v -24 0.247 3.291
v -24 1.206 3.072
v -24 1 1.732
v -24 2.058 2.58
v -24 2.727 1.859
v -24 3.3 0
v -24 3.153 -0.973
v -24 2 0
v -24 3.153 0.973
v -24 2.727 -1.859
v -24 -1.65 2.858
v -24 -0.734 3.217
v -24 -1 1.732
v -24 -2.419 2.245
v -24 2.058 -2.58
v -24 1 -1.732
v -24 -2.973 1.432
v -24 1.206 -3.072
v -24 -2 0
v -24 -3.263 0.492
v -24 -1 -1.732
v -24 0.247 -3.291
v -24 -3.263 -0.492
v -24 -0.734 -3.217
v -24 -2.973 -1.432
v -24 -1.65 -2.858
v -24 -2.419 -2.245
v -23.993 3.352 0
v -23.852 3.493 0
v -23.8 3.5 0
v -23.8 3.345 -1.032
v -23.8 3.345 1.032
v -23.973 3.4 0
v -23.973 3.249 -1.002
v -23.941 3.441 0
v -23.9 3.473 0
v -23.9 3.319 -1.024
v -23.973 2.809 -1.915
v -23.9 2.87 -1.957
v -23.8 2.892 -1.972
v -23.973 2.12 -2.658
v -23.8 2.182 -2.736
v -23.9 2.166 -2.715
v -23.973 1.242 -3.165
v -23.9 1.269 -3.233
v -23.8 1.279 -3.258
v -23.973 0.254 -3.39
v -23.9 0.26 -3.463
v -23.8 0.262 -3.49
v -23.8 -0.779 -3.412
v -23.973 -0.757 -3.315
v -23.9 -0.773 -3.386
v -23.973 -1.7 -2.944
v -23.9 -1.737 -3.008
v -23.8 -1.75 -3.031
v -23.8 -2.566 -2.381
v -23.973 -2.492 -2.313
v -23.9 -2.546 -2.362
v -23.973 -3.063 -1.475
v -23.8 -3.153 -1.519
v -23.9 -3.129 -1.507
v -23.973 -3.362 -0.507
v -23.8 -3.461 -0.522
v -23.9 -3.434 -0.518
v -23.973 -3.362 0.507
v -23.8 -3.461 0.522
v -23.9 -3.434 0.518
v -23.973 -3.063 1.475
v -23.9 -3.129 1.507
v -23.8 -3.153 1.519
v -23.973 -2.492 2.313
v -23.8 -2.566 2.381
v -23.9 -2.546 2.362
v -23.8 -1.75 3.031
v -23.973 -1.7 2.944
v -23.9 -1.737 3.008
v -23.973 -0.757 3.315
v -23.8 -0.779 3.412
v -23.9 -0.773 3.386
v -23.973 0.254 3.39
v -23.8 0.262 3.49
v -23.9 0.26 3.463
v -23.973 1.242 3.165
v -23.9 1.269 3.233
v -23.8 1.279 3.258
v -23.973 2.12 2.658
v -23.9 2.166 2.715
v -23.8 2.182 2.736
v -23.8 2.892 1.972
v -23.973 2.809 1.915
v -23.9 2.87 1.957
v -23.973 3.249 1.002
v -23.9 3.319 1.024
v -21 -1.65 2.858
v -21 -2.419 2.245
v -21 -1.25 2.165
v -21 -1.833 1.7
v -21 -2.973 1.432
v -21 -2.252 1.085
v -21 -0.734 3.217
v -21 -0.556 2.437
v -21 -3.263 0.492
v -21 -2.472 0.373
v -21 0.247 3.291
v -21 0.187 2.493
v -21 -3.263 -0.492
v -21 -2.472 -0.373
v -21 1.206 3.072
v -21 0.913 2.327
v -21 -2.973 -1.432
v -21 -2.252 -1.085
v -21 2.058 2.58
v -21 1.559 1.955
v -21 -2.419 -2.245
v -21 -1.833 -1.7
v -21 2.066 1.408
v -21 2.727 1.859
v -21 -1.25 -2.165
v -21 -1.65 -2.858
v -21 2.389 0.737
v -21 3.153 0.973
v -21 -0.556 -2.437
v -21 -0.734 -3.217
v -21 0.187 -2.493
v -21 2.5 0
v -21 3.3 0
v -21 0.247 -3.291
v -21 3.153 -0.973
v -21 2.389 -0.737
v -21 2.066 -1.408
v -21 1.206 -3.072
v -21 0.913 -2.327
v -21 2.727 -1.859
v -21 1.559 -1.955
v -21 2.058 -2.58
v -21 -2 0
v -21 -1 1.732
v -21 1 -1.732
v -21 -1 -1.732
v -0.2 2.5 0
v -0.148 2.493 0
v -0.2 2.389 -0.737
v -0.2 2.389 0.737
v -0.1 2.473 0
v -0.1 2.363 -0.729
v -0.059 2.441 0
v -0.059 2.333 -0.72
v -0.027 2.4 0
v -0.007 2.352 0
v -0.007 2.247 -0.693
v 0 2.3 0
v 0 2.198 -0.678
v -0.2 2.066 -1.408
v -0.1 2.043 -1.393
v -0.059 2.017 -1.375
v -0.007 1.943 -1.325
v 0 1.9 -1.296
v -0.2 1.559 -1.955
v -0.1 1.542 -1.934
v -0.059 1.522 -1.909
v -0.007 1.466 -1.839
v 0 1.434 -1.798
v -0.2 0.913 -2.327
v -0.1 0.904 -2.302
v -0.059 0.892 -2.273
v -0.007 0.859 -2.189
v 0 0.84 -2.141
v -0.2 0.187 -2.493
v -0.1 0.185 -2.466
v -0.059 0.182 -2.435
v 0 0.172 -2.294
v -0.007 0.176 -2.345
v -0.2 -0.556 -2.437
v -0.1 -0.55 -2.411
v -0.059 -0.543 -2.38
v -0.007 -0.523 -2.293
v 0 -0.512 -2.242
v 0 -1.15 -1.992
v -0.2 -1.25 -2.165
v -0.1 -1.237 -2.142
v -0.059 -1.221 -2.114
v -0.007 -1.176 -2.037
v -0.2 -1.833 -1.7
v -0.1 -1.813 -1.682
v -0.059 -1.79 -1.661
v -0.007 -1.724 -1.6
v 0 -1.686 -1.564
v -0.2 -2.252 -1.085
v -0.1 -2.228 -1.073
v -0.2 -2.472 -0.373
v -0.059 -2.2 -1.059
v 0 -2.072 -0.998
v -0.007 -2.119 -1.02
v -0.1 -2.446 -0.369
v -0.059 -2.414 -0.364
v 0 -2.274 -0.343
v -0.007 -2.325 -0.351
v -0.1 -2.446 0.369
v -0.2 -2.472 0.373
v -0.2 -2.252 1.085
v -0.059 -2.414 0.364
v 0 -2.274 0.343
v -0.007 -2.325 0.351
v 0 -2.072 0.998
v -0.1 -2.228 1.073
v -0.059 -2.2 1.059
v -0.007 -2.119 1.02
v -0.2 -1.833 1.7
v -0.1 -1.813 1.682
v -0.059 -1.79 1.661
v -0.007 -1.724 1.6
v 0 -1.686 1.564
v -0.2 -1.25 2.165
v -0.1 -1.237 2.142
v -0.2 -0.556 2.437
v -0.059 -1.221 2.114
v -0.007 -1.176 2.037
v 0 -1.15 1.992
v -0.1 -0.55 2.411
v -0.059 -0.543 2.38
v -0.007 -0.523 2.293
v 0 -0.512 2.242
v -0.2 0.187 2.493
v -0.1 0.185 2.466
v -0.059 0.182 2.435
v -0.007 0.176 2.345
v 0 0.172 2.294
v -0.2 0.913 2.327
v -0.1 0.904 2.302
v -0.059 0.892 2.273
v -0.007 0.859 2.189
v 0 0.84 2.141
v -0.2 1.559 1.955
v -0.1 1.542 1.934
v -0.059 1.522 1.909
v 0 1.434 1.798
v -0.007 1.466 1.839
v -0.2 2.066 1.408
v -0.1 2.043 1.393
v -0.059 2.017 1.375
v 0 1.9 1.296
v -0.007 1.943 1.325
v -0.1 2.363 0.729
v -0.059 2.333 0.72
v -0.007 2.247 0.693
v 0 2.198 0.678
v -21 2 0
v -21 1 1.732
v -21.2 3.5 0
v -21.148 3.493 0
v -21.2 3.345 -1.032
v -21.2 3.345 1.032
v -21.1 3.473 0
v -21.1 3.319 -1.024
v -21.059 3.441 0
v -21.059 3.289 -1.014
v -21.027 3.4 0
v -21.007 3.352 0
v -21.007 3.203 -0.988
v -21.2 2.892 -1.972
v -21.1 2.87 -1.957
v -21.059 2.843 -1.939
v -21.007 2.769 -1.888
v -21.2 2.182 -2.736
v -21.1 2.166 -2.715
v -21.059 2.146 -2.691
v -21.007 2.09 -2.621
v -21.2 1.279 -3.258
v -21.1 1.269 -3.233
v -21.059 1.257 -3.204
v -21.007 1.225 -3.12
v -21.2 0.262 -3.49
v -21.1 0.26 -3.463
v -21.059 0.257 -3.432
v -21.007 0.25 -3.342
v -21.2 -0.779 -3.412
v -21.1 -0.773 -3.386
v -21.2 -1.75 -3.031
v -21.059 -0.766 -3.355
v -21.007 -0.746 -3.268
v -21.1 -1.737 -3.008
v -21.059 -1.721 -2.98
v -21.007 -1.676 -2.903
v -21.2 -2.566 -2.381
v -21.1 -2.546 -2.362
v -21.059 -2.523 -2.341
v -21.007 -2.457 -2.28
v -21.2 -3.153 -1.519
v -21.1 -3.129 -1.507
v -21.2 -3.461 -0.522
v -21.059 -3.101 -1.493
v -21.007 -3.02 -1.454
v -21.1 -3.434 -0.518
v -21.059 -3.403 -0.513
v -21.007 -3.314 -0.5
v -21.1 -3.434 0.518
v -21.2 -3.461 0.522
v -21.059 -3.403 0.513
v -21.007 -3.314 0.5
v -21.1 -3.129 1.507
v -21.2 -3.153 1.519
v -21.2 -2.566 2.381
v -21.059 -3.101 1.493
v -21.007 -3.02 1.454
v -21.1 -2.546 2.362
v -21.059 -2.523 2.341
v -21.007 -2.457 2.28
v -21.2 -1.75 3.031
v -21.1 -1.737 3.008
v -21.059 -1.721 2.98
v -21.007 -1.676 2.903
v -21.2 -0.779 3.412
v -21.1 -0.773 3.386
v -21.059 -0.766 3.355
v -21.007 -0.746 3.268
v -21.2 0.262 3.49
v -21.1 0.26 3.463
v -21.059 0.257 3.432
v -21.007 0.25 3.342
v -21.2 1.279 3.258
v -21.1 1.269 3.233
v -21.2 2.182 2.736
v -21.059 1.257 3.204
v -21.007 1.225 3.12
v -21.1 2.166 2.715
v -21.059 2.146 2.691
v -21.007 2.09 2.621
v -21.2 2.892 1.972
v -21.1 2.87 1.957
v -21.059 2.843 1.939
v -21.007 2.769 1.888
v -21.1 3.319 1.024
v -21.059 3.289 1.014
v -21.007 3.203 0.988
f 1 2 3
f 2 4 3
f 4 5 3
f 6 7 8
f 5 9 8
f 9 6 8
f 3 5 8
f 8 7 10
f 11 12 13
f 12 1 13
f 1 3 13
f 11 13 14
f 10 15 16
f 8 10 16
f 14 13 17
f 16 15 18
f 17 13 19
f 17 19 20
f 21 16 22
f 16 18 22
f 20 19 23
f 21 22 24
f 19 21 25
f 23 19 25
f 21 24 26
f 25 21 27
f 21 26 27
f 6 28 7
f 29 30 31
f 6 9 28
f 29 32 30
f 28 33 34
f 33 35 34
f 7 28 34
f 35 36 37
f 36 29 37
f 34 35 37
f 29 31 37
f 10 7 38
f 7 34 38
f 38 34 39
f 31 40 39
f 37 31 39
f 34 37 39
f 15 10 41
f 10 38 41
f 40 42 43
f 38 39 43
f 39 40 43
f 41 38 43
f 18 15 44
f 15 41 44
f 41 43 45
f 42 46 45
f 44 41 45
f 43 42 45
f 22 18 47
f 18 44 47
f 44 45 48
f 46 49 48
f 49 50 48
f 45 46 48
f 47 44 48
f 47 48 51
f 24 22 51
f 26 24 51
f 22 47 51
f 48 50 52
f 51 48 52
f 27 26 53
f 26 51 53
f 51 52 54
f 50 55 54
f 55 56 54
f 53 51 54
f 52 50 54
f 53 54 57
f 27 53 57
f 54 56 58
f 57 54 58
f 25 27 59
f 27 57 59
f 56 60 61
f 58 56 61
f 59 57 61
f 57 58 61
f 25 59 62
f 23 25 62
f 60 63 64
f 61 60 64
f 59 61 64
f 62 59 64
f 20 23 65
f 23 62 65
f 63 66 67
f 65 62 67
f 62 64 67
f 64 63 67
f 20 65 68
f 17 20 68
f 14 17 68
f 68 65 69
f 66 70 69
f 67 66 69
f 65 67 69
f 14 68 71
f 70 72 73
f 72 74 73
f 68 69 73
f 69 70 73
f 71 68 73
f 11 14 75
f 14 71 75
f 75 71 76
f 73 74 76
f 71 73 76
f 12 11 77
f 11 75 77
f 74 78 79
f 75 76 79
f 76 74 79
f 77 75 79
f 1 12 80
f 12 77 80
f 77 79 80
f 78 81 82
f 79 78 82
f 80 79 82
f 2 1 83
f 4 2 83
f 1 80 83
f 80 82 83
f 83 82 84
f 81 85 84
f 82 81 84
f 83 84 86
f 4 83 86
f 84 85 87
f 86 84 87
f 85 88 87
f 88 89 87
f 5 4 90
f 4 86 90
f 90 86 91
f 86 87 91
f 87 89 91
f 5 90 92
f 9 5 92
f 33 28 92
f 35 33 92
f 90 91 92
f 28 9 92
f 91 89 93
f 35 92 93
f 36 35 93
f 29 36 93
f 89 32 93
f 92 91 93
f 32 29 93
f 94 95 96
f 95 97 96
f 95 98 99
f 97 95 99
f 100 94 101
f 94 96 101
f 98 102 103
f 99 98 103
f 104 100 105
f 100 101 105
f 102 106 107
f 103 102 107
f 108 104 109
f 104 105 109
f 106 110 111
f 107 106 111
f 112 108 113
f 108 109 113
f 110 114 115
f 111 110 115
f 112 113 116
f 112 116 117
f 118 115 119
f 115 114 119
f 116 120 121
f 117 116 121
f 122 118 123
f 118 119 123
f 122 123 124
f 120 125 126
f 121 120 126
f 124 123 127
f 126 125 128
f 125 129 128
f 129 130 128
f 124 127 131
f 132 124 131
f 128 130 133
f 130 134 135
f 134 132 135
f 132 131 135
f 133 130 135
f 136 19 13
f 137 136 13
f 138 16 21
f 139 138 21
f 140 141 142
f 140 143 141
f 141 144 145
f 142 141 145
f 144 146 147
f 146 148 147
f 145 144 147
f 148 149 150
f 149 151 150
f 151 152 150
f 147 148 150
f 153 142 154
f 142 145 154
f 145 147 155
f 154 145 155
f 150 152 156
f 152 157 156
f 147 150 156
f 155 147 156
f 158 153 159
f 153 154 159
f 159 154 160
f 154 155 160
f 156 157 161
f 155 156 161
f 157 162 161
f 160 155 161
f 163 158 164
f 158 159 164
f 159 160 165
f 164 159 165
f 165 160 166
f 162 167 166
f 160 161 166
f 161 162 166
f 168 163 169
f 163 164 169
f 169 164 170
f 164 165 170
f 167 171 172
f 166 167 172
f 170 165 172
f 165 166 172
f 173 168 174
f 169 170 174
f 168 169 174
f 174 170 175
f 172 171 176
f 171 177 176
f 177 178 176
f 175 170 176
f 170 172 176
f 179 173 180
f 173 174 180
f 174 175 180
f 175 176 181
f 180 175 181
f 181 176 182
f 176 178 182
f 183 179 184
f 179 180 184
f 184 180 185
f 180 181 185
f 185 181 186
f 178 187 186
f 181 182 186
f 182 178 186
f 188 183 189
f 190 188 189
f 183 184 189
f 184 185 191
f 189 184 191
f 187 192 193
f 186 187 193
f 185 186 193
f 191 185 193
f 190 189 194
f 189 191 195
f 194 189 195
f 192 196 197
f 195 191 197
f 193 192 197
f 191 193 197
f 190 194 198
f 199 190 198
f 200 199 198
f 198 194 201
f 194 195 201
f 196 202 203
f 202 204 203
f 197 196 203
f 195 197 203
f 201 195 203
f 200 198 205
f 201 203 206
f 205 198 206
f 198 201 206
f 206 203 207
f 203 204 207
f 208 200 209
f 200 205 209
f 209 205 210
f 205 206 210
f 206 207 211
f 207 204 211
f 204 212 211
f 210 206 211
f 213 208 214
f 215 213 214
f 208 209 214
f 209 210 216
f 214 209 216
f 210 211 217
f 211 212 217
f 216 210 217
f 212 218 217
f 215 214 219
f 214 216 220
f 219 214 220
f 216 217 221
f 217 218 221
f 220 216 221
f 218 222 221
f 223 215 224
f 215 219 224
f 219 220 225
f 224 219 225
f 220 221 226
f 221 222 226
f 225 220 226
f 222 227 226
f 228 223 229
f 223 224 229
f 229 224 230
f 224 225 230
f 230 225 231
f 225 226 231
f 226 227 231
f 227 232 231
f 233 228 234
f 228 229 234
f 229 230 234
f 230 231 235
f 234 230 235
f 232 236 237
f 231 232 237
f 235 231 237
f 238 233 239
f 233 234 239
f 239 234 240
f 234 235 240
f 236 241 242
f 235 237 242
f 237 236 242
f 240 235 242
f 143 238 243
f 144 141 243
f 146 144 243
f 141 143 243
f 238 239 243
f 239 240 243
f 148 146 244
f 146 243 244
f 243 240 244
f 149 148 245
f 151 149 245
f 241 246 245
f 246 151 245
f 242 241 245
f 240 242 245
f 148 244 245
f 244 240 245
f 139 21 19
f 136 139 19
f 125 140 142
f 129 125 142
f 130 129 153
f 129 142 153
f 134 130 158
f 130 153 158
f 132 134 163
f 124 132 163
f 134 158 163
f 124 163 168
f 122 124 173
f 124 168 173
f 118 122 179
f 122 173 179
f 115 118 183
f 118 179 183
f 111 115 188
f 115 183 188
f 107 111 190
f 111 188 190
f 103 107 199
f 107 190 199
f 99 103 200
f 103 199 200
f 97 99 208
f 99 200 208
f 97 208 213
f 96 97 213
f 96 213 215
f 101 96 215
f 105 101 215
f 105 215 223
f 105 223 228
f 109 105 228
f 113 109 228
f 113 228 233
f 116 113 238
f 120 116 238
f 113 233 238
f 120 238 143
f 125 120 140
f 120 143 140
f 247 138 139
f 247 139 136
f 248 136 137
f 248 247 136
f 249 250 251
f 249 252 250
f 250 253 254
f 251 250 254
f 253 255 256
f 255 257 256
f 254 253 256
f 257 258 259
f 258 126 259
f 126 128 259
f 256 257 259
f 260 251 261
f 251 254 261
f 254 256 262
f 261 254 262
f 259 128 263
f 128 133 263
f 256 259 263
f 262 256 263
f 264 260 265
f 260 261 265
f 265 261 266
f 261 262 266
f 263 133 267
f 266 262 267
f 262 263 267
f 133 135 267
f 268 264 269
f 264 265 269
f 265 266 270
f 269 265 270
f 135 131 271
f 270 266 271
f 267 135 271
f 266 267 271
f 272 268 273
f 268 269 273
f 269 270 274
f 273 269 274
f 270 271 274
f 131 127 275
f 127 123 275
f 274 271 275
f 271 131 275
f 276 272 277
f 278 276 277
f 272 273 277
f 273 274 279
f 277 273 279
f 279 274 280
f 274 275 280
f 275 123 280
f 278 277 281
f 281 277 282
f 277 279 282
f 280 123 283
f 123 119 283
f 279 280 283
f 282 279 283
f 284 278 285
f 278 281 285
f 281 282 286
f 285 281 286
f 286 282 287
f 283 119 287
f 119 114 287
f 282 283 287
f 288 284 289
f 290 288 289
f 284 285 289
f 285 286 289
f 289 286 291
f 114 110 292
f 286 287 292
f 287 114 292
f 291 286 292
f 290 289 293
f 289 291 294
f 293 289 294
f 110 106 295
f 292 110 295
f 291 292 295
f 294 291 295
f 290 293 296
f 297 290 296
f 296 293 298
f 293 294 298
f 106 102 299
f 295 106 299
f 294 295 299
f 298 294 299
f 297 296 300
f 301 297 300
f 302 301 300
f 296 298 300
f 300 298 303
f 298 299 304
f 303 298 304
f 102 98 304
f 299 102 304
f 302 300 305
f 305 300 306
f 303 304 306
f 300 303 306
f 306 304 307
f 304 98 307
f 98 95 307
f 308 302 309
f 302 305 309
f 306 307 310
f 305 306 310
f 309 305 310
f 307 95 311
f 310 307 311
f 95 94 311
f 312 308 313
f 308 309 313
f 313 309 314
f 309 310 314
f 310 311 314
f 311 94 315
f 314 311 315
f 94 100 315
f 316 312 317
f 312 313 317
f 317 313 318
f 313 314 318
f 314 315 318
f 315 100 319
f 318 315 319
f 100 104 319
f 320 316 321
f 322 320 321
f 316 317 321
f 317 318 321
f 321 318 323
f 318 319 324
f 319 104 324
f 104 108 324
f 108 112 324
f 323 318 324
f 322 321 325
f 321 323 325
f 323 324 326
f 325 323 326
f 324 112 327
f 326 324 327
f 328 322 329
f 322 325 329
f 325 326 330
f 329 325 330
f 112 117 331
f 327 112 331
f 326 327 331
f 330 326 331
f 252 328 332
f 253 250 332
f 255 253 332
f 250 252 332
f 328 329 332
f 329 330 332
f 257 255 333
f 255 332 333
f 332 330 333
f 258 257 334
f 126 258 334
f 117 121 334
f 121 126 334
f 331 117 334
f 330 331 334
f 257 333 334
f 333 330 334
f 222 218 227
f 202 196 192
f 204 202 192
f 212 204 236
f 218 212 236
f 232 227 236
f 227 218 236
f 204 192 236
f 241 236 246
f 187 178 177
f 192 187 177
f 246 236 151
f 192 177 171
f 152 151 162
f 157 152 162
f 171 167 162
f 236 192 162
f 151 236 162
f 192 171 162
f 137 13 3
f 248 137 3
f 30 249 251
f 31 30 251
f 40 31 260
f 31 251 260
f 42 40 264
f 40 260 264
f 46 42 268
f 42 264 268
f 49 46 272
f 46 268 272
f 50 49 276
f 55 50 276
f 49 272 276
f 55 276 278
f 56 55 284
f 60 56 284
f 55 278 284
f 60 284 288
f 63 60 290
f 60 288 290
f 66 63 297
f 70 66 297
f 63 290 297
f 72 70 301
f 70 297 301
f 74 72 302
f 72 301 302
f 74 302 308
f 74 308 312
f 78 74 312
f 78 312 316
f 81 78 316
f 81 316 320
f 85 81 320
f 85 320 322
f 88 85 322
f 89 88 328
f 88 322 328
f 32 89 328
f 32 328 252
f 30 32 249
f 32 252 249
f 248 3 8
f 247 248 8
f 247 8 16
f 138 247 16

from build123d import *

# Parameters (mm, degrees)
FILLET1_R          = 0.2
CUT_EXTRUDE1_DEPTH = 3


with BuildPart() as part:
    # Sketch1 → Revolve1 (revolve)
    with BuildSketch(Plane.XY):
        Polygon((0, 0), (-24, 0), (-24, 3.5), (-21, 3.5), (-21, 2.5), (0, 2.5), align=None)
    revolve(axis=Axis((0, 0, 0), (-1, 0, 0)))

    # Fillet1
    fillet1_edges = [part.edges().sort_by_distance(p)[0] for p in [
        (0, -2.5, 0),
        (-21, -3.5, 0),
        (-24, -3.5, 0),
    ]]
    fillet(fillet1_edges, radius=FILLET1_R)

    # Sketch2 → Cut-Extrude1 (cut)
    with BuildSketch(Plane.ZY.offset(24)):
        Polygon((0, 2), (-1.732050808, 1), (-1.732050808, -1), (0, -2), (1.732050808, -1), (1.732050808, 1), align=None)
    extrude(amount=-CUT_EXTRUDE1_DEPTH, mode=Mode.SUBTRACT)


solid = part.part
